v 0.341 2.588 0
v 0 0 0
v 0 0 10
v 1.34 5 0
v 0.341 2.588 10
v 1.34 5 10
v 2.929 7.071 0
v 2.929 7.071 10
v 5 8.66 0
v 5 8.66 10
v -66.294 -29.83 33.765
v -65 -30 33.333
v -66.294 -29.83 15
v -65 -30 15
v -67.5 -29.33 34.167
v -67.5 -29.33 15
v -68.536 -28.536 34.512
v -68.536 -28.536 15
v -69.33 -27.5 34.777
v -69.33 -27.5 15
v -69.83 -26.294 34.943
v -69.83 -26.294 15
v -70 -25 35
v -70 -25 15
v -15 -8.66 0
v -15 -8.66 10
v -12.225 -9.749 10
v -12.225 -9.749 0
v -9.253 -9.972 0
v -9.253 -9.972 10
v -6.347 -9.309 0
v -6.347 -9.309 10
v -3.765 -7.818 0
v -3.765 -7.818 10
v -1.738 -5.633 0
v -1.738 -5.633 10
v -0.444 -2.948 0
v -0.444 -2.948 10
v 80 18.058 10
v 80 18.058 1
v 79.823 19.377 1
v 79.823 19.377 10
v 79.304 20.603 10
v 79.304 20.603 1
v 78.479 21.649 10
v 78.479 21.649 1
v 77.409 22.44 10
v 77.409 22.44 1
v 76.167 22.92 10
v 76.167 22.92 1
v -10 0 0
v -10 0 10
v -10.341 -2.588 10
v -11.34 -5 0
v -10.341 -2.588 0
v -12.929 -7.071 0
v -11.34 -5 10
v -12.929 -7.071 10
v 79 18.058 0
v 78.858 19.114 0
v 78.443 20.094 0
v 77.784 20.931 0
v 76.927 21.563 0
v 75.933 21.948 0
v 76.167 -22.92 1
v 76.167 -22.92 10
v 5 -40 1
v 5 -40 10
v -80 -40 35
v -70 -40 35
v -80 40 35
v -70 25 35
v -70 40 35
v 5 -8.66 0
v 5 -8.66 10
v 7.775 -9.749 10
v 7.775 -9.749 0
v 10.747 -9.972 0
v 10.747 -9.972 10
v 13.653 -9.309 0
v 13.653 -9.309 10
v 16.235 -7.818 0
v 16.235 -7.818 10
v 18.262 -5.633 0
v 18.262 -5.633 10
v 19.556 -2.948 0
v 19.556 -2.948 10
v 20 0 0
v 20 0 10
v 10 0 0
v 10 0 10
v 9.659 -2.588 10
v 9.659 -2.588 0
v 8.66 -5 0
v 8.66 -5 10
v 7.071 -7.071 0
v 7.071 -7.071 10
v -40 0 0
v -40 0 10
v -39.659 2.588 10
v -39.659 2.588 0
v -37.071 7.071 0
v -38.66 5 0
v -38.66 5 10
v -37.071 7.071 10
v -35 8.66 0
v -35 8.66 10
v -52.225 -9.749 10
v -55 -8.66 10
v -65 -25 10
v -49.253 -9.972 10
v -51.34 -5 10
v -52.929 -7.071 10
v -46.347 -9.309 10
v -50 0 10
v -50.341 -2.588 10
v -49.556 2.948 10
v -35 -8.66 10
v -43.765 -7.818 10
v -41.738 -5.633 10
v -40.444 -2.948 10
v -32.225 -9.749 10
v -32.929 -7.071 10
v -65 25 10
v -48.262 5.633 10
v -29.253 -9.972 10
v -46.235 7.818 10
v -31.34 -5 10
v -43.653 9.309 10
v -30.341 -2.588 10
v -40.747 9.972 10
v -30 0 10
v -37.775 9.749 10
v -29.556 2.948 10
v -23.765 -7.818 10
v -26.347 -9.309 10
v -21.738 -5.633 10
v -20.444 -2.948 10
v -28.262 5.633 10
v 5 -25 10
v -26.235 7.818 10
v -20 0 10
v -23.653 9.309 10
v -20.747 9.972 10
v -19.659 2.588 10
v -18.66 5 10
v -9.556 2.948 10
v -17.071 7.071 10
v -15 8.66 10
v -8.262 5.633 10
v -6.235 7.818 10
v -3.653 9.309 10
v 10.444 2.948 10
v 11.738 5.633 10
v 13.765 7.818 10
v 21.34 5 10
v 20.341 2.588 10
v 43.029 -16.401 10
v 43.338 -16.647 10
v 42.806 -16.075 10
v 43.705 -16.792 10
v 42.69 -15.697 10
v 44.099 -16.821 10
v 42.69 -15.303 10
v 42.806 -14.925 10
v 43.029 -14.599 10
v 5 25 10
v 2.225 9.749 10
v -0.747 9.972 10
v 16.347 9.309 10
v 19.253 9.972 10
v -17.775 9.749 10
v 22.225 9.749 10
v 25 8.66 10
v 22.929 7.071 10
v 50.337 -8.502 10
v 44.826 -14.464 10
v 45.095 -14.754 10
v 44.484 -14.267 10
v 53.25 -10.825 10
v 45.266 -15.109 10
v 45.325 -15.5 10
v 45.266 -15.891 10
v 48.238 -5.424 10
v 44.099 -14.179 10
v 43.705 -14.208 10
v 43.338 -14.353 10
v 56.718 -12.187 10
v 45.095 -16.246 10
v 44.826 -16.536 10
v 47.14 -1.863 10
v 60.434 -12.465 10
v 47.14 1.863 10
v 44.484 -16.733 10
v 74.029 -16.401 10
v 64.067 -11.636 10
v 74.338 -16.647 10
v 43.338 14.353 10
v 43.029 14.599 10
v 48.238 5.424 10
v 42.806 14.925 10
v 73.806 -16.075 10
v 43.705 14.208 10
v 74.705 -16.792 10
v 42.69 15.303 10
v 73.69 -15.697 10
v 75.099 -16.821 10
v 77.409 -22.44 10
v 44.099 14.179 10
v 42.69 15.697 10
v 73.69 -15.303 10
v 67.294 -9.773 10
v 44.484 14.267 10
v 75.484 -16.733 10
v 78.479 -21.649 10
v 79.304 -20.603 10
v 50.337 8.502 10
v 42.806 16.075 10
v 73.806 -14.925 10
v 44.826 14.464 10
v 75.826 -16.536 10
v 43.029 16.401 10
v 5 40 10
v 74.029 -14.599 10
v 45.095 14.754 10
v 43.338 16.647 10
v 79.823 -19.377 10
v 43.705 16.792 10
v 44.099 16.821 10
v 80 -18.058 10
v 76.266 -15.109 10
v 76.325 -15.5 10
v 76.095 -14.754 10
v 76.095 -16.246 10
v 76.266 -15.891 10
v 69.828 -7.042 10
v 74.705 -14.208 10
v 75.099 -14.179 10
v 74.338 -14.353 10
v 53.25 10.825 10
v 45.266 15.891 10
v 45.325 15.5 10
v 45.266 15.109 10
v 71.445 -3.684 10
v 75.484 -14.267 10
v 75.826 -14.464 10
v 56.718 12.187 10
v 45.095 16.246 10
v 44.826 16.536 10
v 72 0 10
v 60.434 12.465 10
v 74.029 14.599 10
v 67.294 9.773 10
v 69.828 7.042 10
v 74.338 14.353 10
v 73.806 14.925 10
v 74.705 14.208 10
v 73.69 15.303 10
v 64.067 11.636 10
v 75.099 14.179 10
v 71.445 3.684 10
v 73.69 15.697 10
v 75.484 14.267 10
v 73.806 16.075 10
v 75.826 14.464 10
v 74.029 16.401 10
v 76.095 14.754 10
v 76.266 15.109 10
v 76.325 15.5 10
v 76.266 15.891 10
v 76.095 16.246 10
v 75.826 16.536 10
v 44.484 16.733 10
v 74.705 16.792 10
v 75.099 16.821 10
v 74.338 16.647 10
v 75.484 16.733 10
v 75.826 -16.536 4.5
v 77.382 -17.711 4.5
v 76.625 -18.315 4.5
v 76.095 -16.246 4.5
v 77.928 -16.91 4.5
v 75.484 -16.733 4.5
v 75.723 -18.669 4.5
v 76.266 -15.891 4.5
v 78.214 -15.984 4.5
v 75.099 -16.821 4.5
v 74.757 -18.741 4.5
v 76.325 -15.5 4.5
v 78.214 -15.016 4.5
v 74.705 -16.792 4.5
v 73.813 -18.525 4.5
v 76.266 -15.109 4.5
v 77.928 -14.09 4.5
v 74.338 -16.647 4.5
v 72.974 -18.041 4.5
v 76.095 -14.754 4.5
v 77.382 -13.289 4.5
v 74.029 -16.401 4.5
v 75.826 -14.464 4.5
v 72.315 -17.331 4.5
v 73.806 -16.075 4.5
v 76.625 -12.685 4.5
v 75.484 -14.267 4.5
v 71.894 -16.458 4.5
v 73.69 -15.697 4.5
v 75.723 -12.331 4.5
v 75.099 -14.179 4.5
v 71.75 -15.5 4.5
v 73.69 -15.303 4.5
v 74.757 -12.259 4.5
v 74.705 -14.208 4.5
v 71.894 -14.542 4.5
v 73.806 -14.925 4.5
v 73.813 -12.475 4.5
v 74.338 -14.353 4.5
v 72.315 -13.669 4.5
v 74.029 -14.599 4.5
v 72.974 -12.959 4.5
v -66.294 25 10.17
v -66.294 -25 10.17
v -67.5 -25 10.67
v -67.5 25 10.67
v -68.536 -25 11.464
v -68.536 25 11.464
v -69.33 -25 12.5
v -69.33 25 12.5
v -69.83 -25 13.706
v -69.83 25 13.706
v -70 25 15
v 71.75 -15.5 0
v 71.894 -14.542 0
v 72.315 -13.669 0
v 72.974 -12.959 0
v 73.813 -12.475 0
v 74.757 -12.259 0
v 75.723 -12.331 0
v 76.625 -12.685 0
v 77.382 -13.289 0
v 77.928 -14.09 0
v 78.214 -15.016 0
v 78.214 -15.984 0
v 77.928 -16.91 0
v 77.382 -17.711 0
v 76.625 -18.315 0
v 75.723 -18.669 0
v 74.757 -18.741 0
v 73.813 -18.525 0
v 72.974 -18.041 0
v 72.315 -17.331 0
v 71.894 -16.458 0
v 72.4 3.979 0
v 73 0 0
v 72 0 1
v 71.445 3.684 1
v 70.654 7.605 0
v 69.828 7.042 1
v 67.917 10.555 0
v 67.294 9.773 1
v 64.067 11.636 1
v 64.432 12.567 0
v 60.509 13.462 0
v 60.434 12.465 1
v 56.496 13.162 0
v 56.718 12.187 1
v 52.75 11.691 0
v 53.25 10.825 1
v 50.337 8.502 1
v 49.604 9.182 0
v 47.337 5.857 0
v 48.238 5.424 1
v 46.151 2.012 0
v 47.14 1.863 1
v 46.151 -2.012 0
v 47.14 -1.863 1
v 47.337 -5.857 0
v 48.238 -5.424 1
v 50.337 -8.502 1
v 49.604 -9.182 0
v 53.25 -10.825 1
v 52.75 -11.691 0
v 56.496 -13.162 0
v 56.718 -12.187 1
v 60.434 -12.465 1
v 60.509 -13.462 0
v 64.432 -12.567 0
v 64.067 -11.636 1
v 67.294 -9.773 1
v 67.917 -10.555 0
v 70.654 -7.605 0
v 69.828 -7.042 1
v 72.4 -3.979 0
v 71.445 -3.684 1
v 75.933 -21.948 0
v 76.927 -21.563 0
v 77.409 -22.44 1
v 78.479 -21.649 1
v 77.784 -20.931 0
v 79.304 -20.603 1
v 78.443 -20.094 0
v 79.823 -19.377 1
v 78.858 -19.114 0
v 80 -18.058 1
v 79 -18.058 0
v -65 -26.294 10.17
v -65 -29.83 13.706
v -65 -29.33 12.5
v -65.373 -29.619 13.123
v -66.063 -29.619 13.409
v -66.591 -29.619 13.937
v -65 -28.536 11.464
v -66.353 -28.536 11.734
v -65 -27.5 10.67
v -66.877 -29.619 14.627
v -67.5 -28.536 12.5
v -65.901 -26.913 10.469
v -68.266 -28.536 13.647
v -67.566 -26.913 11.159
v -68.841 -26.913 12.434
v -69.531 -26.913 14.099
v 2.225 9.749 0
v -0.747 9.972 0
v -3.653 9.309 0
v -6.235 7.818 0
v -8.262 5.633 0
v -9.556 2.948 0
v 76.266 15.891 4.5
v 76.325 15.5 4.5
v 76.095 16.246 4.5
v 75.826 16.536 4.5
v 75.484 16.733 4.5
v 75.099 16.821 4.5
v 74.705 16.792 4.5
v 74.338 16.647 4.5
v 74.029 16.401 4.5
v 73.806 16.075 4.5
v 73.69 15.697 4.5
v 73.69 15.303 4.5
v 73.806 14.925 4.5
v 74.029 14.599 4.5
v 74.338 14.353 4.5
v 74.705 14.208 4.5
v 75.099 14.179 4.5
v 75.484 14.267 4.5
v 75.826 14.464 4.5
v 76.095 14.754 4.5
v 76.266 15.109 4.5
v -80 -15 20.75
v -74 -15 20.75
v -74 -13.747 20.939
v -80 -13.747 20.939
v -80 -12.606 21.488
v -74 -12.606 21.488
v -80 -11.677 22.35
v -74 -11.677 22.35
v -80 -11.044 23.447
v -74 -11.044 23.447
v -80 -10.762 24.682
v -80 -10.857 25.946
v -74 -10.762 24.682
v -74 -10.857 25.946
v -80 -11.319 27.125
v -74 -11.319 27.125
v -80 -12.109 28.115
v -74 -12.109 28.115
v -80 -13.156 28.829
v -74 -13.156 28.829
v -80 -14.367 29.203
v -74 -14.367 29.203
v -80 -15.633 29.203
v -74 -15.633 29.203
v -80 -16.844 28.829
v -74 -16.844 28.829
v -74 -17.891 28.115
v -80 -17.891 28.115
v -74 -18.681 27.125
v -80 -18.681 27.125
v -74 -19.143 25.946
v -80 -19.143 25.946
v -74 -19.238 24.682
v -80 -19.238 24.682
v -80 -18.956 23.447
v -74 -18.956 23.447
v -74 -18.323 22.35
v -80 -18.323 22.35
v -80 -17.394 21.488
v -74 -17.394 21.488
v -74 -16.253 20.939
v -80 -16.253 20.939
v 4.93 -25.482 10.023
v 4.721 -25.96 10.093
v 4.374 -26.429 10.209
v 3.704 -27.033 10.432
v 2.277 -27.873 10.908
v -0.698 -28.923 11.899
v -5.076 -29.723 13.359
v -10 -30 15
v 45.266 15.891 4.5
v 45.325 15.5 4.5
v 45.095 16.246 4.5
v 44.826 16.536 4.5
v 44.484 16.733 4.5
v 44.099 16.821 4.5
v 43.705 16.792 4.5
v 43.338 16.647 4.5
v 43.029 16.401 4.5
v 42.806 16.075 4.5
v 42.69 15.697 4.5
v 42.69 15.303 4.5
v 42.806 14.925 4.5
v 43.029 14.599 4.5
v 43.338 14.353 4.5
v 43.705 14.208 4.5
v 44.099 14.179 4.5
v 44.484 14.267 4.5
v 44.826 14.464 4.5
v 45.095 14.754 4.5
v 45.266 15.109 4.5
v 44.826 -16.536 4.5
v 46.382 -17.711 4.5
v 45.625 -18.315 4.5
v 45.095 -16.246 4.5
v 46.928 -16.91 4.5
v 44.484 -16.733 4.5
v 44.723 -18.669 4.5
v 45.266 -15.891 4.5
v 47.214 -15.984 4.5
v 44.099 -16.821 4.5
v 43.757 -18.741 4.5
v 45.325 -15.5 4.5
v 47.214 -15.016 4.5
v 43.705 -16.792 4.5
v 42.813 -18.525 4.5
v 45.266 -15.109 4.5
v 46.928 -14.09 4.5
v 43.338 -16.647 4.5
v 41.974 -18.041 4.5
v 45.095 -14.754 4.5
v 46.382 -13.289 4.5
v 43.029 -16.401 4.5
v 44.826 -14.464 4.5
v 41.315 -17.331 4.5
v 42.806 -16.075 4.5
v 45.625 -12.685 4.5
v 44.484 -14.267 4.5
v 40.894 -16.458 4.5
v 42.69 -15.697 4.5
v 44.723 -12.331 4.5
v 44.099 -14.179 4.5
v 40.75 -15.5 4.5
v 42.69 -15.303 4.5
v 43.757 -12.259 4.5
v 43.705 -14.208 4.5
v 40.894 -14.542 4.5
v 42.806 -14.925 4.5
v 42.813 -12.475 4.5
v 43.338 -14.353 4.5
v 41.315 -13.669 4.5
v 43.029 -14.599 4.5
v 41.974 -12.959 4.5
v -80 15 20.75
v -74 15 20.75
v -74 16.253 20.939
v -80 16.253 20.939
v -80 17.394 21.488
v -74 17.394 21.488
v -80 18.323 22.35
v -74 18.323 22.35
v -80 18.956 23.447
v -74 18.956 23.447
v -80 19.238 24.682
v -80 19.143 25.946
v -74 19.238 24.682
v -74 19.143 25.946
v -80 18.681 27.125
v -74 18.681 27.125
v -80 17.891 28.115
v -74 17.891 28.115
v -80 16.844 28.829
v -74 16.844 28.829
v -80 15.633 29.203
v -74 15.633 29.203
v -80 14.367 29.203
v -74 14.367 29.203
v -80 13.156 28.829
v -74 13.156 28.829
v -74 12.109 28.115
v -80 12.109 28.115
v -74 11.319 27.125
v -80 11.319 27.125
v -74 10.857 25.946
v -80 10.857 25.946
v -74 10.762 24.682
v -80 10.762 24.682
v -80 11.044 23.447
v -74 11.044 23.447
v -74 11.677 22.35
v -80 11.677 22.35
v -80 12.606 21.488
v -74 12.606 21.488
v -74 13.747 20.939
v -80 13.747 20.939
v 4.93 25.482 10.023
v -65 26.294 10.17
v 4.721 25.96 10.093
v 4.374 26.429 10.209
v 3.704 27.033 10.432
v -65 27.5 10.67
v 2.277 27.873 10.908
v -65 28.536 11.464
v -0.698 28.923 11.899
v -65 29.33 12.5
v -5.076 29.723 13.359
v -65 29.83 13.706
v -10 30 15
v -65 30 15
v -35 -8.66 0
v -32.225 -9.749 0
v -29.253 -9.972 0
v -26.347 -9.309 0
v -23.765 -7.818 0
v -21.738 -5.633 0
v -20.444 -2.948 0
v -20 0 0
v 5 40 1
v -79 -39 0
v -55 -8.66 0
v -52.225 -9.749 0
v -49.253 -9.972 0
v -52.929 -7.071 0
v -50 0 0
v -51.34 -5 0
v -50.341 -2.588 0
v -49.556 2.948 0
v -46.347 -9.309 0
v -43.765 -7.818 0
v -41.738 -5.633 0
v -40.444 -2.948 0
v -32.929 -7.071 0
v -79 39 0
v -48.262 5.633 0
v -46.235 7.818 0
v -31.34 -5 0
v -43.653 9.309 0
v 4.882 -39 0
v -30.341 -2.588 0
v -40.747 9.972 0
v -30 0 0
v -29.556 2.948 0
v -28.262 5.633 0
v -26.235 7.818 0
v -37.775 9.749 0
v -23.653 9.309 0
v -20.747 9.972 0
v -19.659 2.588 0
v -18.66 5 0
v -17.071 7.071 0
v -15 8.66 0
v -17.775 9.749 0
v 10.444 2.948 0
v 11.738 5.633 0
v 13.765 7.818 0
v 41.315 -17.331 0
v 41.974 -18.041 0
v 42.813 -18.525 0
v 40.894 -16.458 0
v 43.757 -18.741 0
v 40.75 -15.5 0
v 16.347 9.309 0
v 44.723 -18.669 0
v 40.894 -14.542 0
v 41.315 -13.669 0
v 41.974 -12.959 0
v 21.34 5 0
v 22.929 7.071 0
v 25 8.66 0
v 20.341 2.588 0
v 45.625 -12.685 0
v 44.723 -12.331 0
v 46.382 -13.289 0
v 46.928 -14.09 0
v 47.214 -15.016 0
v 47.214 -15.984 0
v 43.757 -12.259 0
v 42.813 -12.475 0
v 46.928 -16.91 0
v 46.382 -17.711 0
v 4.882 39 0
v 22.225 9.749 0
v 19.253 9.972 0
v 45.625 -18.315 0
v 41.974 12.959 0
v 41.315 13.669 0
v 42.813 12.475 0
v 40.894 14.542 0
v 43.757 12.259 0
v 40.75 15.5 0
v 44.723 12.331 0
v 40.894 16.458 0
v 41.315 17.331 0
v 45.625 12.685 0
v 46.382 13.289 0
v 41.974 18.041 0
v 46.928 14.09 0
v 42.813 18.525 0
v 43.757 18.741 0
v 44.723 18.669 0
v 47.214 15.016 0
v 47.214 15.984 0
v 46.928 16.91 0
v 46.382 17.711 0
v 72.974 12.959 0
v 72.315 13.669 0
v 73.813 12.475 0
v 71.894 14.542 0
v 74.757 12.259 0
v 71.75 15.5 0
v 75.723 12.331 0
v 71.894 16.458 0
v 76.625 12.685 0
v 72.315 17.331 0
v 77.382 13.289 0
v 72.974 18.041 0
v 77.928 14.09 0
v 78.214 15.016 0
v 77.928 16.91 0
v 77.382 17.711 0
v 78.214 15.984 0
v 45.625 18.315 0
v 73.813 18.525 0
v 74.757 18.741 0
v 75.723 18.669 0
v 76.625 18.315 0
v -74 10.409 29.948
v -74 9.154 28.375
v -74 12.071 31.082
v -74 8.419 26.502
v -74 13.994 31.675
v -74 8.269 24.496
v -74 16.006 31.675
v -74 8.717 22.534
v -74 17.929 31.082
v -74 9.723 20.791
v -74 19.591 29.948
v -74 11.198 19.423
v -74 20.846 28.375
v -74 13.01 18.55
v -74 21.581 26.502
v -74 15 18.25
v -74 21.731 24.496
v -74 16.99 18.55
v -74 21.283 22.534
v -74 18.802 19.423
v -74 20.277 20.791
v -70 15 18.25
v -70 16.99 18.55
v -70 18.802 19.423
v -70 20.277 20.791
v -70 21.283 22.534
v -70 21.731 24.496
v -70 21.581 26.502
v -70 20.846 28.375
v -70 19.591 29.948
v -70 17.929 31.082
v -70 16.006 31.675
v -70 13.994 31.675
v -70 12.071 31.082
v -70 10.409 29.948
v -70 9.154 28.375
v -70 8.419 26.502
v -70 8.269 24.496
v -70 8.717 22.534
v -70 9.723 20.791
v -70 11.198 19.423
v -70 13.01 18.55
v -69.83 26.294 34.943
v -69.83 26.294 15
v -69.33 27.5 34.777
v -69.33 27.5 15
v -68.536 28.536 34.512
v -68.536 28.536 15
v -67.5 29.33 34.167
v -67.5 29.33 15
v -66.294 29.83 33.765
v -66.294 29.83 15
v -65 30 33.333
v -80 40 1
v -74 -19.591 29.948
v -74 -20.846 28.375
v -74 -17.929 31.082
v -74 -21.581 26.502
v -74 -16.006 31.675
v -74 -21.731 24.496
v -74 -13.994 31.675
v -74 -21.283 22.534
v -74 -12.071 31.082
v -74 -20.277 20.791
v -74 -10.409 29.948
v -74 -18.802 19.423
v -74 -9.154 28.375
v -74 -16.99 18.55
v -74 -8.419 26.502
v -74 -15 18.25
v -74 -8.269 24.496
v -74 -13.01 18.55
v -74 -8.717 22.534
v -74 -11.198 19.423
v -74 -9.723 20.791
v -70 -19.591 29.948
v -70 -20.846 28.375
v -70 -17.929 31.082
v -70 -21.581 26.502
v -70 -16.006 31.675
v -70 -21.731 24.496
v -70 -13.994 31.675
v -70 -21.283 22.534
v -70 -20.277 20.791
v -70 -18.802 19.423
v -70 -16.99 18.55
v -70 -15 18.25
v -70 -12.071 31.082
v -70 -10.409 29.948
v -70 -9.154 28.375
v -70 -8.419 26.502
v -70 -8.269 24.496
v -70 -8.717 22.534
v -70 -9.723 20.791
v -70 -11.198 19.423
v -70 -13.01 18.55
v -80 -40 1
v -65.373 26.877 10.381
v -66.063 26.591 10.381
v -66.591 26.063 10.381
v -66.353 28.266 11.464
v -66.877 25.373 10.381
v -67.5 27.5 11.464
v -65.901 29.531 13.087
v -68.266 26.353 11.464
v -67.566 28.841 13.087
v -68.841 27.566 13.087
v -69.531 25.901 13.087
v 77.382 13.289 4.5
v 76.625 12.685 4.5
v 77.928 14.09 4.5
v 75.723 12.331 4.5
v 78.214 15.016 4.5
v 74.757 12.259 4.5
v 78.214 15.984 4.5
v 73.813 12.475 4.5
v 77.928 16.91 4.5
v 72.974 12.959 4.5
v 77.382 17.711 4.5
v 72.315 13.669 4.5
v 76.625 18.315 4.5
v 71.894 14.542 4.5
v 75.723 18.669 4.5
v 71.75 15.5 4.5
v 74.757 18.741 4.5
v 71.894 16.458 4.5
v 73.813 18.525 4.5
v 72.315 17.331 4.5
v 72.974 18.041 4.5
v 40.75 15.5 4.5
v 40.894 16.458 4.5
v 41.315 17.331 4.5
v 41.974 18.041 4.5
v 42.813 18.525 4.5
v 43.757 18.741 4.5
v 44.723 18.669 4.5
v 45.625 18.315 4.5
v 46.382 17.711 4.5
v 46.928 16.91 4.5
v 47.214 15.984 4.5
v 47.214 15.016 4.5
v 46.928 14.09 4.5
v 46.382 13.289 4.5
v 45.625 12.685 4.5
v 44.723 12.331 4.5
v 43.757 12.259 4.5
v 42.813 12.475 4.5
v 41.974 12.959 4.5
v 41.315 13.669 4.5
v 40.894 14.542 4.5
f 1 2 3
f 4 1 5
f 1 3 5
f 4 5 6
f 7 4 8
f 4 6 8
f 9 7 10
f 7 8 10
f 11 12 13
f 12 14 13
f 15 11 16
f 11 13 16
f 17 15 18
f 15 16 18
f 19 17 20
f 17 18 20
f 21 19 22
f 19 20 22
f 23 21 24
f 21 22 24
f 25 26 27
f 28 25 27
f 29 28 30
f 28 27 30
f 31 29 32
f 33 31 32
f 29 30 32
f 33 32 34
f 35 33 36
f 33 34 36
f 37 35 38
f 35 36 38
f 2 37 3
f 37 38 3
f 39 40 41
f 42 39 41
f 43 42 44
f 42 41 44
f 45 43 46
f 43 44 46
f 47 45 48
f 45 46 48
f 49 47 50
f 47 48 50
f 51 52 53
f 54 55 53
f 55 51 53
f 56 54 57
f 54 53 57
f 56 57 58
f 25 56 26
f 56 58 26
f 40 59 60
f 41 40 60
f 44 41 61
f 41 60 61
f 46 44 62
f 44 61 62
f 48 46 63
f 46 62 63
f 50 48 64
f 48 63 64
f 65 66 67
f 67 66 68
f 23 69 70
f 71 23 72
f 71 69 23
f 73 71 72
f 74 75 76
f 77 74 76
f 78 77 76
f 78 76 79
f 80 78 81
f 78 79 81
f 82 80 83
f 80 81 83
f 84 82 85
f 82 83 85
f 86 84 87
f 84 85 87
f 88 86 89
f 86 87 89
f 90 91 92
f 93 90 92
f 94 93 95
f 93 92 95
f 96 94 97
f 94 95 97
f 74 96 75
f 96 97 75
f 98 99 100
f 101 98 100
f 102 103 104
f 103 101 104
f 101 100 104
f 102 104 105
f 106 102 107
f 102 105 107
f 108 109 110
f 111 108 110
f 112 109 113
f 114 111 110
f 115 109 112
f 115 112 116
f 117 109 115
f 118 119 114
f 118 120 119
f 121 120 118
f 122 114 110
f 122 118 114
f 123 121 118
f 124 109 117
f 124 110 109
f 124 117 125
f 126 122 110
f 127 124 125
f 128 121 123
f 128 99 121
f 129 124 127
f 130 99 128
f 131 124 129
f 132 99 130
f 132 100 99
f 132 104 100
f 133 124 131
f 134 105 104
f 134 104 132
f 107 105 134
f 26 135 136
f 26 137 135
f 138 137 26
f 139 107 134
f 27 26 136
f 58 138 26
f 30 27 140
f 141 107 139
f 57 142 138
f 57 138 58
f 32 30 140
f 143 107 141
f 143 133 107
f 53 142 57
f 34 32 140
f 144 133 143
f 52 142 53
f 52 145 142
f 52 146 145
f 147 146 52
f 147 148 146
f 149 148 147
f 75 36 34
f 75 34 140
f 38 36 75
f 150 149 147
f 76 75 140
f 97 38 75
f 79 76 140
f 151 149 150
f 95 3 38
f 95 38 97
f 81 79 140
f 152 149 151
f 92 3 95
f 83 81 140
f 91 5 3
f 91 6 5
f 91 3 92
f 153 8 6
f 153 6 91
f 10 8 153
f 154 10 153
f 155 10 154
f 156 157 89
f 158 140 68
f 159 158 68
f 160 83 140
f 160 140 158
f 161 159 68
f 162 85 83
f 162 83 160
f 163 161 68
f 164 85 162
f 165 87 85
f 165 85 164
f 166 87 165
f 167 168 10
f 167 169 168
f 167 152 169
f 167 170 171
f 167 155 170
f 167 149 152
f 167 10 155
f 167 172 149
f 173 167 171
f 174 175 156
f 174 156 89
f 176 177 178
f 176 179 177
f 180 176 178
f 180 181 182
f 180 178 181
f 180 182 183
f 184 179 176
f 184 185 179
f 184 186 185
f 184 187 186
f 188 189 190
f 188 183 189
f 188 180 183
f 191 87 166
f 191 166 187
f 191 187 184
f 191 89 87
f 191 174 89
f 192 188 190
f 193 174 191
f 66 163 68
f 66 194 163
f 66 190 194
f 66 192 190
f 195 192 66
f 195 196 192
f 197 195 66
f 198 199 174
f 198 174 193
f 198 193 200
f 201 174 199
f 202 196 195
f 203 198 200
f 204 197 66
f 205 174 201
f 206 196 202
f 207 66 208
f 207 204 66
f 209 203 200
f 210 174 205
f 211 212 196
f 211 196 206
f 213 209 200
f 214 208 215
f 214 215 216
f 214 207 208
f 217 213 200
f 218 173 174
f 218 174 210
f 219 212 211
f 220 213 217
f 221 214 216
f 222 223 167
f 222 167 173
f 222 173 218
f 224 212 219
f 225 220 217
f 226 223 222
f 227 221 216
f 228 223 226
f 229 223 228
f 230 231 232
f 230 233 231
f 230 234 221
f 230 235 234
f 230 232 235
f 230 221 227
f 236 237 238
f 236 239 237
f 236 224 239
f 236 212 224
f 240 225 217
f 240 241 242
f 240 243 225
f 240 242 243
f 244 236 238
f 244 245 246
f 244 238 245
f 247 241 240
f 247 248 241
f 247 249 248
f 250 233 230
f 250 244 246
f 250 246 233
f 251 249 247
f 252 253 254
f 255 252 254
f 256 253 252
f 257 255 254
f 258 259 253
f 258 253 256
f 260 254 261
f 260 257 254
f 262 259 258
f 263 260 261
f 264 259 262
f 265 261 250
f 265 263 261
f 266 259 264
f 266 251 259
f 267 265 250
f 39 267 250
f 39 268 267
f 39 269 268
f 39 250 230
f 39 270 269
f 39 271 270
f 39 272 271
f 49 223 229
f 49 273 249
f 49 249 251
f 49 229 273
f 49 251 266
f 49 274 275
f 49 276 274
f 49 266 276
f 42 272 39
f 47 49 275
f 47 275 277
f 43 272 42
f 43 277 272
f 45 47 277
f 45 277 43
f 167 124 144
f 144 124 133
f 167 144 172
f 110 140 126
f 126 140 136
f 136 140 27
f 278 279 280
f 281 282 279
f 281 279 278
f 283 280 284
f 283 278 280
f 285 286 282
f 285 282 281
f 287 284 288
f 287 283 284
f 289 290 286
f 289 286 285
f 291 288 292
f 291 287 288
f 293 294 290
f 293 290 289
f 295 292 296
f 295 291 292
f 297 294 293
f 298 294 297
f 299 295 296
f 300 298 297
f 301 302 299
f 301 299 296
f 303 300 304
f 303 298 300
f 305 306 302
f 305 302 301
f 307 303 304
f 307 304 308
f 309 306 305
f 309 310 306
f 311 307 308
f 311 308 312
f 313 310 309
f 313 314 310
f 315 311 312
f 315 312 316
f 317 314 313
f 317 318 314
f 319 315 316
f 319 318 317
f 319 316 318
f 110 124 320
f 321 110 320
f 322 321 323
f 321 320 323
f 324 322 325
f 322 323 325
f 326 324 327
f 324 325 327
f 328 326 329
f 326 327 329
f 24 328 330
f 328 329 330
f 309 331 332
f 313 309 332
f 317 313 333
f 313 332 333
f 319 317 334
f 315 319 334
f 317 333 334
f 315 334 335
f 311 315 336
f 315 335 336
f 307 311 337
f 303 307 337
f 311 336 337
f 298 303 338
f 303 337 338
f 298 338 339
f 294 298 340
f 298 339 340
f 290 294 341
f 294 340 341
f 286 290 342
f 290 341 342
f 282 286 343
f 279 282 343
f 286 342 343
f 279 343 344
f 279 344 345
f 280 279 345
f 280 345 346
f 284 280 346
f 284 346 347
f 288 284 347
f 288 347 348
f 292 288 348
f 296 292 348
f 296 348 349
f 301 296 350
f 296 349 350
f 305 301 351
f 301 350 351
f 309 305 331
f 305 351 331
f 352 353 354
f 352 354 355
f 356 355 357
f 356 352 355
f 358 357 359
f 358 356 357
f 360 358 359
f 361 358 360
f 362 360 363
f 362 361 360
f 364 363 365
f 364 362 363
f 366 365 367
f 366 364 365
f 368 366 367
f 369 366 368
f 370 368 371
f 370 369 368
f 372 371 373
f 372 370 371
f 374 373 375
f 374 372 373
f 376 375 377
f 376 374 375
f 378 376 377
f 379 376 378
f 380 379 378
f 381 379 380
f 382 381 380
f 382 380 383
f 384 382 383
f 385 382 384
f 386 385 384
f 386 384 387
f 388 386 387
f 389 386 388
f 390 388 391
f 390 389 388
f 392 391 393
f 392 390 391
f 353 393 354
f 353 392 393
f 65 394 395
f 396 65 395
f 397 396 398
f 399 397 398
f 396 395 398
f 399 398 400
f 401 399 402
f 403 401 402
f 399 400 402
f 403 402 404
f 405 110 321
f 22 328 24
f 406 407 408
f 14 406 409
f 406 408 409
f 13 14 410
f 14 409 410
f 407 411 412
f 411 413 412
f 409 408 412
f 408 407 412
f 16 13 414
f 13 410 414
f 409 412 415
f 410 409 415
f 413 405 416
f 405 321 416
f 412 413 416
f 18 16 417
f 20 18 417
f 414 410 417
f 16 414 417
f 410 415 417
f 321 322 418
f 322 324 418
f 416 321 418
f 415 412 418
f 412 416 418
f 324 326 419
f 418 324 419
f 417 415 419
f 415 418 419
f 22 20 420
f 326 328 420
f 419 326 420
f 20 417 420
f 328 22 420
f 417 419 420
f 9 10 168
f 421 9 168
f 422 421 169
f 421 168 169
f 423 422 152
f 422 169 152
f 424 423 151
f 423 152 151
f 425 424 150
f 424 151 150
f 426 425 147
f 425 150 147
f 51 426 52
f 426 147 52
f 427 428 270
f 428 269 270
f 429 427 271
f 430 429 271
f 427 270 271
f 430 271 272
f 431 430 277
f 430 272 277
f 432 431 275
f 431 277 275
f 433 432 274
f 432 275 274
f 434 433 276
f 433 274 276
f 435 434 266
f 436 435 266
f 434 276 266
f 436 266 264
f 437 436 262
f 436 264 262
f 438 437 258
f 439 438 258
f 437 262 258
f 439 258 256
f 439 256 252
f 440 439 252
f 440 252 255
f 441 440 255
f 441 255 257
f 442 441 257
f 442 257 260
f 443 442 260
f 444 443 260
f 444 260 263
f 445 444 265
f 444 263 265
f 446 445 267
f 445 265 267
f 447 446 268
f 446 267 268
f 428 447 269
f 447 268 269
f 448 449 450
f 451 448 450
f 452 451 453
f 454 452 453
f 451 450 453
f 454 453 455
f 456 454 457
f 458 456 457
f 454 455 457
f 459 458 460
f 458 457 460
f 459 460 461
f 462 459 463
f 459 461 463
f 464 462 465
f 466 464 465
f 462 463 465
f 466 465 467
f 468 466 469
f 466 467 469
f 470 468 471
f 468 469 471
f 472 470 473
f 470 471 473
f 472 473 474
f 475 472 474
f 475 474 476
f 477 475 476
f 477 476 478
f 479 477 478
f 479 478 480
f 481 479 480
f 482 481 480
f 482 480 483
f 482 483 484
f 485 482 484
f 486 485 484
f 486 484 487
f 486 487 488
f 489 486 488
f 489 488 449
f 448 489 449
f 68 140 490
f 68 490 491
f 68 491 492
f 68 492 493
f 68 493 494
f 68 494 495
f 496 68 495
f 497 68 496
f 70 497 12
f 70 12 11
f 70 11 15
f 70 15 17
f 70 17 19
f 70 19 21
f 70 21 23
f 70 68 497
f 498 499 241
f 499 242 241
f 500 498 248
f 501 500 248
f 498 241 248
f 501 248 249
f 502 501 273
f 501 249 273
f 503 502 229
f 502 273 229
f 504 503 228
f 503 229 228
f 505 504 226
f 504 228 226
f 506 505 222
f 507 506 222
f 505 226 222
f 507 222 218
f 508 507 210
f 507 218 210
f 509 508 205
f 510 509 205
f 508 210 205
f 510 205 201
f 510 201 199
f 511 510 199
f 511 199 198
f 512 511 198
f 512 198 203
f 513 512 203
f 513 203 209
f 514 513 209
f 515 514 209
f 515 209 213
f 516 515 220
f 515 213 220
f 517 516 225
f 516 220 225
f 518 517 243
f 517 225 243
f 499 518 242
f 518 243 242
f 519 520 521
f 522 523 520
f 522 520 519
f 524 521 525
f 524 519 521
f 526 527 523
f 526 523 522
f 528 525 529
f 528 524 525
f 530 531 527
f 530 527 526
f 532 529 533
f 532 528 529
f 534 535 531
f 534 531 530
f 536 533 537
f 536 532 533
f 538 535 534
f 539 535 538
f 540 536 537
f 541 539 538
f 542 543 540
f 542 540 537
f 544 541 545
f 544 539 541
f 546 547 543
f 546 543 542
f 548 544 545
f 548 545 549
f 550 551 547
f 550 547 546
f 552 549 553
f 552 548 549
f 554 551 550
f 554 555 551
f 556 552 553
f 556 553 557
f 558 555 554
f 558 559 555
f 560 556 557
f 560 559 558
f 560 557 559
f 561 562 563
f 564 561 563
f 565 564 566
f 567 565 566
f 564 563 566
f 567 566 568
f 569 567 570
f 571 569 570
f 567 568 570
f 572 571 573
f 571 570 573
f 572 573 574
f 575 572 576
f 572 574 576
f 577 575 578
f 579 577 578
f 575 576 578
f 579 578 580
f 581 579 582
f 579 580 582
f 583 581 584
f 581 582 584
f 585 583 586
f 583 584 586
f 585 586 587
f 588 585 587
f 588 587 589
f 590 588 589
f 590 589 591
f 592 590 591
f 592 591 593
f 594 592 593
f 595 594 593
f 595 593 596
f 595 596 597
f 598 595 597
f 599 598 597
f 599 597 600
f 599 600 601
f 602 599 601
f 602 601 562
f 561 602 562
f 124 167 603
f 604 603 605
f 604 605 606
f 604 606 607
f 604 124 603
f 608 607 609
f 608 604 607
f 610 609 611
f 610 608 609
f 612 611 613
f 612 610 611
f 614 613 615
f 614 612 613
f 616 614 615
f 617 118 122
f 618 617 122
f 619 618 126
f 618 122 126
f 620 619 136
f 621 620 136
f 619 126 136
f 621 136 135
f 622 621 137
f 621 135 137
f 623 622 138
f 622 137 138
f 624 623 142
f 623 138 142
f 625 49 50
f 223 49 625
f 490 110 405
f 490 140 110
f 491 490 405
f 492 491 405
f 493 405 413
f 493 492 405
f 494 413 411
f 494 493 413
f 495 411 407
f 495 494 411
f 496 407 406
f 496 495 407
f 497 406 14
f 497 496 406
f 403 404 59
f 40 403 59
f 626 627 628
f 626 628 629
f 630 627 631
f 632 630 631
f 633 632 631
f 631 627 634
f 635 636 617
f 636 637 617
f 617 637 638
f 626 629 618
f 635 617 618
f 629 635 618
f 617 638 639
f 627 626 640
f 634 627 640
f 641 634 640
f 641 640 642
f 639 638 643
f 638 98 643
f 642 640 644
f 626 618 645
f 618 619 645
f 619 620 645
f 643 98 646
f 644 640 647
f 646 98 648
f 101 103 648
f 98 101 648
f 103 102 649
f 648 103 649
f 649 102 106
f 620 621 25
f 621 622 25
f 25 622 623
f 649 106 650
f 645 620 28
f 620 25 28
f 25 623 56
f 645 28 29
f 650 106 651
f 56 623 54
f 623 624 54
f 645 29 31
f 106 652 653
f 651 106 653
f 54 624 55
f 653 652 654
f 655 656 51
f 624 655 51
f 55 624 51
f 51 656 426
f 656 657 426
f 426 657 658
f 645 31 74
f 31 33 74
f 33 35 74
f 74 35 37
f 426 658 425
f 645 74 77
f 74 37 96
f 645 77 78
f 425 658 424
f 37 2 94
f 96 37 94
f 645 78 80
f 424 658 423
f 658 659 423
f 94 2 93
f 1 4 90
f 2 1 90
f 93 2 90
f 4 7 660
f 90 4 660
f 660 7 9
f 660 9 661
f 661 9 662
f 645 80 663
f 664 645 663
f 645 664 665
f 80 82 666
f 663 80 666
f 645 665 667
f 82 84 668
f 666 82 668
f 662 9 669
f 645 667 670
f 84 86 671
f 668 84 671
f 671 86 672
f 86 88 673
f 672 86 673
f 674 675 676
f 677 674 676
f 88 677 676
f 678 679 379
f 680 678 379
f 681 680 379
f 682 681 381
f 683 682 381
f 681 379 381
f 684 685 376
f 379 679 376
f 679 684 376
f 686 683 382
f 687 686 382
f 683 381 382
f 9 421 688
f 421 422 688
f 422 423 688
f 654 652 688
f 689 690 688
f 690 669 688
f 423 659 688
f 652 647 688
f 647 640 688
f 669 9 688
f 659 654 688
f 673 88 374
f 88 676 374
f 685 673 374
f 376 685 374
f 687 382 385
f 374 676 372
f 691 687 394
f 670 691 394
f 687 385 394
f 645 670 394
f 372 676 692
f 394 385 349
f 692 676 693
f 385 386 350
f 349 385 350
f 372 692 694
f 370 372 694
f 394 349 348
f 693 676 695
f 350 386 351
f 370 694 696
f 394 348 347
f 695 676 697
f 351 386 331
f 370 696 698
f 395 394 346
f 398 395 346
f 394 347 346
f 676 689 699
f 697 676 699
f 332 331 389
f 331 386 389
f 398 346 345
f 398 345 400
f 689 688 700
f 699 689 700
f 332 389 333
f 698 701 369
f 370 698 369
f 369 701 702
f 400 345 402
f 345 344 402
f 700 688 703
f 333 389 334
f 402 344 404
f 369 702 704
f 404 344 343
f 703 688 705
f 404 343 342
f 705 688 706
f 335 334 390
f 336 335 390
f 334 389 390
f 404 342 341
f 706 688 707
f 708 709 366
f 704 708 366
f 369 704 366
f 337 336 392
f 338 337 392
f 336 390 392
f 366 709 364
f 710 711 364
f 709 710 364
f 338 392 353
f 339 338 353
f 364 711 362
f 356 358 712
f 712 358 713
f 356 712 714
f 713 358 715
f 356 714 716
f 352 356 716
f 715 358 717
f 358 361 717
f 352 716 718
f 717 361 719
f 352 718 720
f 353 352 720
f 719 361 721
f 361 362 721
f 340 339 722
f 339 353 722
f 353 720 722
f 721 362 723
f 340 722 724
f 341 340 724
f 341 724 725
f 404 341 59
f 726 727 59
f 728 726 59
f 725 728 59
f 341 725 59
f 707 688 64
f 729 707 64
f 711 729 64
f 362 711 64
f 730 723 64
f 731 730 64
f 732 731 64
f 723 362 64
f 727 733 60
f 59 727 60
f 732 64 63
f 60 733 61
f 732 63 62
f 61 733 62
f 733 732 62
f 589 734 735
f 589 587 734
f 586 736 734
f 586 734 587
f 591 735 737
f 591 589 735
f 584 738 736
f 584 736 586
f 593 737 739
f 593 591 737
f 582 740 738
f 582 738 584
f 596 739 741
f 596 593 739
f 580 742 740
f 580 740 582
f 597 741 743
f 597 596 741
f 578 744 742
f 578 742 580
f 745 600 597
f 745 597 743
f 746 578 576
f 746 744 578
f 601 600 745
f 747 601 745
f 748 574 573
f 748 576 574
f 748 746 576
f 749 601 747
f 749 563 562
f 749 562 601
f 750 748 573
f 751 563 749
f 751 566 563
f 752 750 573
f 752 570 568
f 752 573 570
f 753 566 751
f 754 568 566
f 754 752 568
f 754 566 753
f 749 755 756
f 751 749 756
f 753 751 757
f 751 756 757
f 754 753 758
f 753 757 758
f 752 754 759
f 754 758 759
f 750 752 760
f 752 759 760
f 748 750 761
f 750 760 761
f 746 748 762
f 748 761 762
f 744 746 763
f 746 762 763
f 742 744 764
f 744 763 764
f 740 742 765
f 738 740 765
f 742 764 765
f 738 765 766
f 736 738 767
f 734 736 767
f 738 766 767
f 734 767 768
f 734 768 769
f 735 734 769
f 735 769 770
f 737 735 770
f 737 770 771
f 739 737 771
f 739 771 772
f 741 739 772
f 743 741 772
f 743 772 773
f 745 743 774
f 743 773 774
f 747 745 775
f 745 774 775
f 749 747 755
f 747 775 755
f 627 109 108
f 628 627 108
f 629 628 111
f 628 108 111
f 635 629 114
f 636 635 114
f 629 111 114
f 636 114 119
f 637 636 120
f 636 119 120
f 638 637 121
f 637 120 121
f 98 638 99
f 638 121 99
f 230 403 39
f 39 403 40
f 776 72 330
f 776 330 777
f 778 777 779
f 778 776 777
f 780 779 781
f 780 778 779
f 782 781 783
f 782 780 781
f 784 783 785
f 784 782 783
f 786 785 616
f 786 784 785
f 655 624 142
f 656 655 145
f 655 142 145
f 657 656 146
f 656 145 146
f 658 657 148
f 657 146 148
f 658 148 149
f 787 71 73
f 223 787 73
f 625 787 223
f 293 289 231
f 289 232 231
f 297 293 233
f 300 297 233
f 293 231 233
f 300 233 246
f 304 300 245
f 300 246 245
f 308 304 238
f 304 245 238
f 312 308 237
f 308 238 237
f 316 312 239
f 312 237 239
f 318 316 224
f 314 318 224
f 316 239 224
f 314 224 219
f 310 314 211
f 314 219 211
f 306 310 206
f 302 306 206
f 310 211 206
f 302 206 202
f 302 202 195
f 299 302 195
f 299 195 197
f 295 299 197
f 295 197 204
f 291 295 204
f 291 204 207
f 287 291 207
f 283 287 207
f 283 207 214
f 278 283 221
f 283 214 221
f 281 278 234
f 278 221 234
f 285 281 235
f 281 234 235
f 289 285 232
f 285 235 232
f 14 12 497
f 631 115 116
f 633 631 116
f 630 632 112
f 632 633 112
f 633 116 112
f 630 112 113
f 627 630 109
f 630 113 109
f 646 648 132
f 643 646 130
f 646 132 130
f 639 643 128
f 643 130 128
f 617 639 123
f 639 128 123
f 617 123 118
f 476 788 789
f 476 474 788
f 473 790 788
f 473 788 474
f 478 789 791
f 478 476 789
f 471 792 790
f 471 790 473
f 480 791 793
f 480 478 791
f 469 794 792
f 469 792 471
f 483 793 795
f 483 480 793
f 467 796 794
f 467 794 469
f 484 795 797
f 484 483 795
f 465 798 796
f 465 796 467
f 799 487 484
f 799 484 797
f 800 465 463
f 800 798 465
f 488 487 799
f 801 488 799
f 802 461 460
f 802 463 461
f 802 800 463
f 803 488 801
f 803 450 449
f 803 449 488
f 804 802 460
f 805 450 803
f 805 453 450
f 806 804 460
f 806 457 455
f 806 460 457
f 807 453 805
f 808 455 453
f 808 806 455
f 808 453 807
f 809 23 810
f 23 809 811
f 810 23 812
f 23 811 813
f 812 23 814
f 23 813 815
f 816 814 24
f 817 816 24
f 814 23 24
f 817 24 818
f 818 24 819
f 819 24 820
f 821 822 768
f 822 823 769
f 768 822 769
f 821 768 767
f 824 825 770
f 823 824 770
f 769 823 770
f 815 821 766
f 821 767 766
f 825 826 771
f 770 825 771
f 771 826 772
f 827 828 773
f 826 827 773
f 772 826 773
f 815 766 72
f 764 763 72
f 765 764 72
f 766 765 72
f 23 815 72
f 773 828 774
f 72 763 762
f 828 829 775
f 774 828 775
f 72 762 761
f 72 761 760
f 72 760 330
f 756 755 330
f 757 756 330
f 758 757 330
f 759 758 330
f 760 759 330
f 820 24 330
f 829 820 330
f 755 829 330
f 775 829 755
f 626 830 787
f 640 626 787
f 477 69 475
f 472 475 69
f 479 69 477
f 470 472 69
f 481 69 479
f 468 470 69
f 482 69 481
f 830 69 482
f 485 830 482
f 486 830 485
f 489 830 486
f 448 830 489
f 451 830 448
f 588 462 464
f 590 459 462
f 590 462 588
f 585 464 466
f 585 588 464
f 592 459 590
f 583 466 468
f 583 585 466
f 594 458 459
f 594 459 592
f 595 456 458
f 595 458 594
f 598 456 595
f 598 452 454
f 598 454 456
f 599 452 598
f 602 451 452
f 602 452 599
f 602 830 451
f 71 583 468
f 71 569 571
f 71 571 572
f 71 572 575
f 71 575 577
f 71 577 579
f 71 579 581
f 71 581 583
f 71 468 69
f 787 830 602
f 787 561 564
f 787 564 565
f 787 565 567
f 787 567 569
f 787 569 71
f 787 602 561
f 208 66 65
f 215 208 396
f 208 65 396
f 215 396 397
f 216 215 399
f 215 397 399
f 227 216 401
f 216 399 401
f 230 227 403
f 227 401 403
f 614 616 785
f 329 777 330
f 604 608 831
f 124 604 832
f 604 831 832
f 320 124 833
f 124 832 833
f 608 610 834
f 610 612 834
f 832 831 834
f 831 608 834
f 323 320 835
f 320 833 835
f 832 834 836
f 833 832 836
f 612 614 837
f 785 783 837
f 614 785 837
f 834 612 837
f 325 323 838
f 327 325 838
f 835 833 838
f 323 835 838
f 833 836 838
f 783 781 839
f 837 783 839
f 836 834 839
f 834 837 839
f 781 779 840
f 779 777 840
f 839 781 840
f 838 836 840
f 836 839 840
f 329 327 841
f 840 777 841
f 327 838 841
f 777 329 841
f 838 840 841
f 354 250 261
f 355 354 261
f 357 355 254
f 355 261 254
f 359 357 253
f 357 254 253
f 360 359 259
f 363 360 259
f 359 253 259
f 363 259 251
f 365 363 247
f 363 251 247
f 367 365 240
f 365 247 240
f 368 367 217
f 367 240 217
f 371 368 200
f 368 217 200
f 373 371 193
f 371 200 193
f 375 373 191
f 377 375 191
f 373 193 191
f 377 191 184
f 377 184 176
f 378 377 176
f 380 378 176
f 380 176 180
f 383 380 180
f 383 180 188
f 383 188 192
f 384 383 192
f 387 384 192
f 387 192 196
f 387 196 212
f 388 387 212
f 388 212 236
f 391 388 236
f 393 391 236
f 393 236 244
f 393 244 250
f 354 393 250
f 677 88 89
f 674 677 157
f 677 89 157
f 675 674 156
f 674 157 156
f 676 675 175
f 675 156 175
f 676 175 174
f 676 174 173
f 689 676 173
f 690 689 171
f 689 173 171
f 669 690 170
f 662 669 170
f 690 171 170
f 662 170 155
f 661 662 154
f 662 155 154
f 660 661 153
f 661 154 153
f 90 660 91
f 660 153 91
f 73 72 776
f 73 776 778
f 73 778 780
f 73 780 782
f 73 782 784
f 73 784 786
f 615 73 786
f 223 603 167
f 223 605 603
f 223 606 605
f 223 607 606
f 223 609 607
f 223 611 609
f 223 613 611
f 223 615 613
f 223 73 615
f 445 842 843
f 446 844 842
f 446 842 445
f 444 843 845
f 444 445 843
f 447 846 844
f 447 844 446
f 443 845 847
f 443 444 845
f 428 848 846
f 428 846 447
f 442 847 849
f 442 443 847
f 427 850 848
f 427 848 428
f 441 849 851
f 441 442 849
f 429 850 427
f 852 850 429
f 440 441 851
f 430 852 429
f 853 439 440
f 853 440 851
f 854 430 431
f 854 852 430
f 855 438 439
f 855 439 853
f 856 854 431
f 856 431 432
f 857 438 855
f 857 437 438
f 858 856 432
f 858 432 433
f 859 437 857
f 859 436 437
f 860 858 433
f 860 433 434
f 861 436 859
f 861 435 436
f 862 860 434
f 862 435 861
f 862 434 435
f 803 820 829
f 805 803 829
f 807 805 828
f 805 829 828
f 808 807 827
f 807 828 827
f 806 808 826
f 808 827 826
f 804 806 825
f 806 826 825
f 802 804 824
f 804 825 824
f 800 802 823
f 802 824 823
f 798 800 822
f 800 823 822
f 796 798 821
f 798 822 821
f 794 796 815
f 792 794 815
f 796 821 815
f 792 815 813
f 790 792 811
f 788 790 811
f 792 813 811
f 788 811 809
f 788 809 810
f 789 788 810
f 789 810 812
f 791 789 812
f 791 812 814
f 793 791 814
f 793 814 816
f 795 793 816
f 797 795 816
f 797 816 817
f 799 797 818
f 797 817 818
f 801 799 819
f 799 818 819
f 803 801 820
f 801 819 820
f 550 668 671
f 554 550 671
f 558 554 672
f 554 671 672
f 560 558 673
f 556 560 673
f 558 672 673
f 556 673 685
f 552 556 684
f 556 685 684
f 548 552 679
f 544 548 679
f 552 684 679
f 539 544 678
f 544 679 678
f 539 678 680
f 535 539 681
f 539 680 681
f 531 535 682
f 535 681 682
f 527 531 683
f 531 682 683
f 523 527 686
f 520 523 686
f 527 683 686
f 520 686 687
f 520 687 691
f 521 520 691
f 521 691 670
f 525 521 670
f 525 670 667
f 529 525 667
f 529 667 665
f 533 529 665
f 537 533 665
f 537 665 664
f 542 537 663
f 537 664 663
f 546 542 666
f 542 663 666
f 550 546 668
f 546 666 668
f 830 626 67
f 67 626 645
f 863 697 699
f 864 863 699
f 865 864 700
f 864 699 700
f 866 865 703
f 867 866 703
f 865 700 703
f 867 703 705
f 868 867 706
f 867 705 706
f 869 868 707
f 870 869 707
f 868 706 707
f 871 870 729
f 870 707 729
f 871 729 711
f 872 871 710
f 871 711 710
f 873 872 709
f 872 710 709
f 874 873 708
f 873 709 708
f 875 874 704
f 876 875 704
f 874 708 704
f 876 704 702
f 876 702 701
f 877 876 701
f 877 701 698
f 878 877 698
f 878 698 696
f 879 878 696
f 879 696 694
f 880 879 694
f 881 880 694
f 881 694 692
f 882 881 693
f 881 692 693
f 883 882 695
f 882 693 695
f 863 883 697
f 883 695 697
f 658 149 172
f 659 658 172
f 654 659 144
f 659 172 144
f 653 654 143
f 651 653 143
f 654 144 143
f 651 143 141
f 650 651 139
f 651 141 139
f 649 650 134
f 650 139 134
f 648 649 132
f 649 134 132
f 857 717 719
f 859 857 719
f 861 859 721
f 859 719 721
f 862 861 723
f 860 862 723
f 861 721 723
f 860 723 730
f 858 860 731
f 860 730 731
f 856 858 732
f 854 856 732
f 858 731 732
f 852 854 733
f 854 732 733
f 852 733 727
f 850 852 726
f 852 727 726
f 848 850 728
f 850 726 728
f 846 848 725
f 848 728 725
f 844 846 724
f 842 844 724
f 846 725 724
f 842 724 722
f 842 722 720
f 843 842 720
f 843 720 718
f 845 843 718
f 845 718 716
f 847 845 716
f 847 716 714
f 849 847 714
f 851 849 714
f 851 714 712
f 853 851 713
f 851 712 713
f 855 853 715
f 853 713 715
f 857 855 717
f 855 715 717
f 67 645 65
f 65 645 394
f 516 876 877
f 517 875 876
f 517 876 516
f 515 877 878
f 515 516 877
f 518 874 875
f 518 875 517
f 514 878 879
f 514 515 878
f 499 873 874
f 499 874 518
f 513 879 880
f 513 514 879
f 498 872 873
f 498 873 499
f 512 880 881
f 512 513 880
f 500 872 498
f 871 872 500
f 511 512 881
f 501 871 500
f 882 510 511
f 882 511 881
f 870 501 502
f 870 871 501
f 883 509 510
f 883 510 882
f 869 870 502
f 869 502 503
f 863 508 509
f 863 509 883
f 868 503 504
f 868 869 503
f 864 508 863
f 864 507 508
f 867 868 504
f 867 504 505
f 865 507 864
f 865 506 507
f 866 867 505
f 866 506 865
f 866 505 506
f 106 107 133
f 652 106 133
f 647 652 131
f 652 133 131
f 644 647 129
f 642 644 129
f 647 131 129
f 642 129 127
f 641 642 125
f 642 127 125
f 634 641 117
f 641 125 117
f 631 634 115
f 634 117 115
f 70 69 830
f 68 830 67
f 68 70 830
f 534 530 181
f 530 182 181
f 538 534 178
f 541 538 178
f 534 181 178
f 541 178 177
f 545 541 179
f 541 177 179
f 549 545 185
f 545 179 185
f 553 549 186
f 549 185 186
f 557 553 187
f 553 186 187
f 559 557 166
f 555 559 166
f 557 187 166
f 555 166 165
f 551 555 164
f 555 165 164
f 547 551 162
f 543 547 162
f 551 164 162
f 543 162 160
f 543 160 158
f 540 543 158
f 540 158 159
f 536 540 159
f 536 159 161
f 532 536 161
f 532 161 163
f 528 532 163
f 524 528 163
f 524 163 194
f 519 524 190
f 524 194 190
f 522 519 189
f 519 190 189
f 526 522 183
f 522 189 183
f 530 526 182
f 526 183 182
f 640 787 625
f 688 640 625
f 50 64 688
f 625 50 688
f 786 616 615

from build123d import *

# Parameters (mm, degrees)
SKETCH1_W           = 160
SKETCH1_H           = 80
BOSS_EXTRUDE1_DEPTH = 10
SKETCH2_R           = 1.325
SKETCH2_R_2         = 12.5
CUT_EXTRUDE1_DEPTH  = 3
CUT_EXTRUDE2_REACH  = 9
SKETCH4_R           = 1.325
SKETCH4_R_2         = 12.5
SKETCH7_W           = 10
SKETCH7_H           = 80
BOSS_EXTRUDE3_DEPTH = 25
BOSS_EXTRUDE4_DEPTH = 10
BOSS_EXTRUDE5_DEPTH = 10
CUT_EXTRUDE3_REACH  = 12
CUT_EXTRUDE4_DEPTH  = 10
FILLET1_R           = 5
SKETCH12_R          = 3.25
CUT_EXTRUDE5_DEPTH  = 4.5
CUT_EXTRUDE6_REACH  = 12
SKETCH13_R          = 4.25
SKETCH14_R          = 6.75
CUT_EXTRUDE7_DEPTH  = 4
FILLET2_R           = 5
CHAMFER2_SIZE       = 1


with BuildPart() as part:
    # Sketch1 → Boss-Extrude1 (new body)
    with BuildSketch(Plane.XY):
        Rectangle(SKETCH1_W, SKETCH1_H)
    extrude(amount=BOSS_EXTRUDE1_DEPTH)

    # Sketch2 → Cut-Extrude1 (cut)
    with BuildSketch(Plane.XY.offset(10)):
        with Locations((44, 15.5)):
            Circle(SKETCH2_R)
        with Locations((75, 15.5)):
            Circle(SKETCH2_R)
        with Locations((44, -15.5)):
            Circle(SKETCH2_R)
        with Locations((75, -15.5)):
            Circle(SKETCH2_R)
        with Locations((59.5, 0)):
            Circle(SKETCH2_R_2)
    extrude(amount=-CUT_EXTRUDE1_DEPTH, mode=Mode.SUBTRACT)

    # Sketch4 → Cut-Extrude2 (cut, up to next)
    with BuildSketch(Plane.XY.offset(7), mode=Mode.PRIVATE) as cut_extrude2_sk1:
        with Locations((75, -15.5)):
            Circle(SKETCH4_R)
    cut_extrude2_tool1 = extrude(cut_extrude2_sk1.sketch, amount=-CUT_EXTRUDE2_REACH, mode=Mode.PRIVATE) & part.part
    add(cut_extrude2_tool1.solids().sort_by_distance((75, -15.5, 7))[0], mode=Mode.SUBTRACT)
    # Sketch4 → Cut-Extrude2 (cut, up to next)
    with BuildSketch(Plane.XY.offset(7), mode=Mode.PRIVATE) as cut_extrude2_sk2:
        with Locations((44, -15.5)):
            Circle(SKETCH4_R)
    cut_extrude2_tool2 = extrude(cut_extrude2_sk2.sketch, amount=-CUT_EXTRUDE2_REACH, mode=Mode.PRIVATE) & part.part
    add(cut_extrude2_tool2.solids().sort_by_distance((44, -15.5, 7))[0], mode=Mode.SUBTRACT)
    # Sketch4 → Cut-Extrude2 (cut, up to next)
    with BuildSketch(Plane.XY.offset(7), mode=Mode.PRIVATE) as cut_extrude2_sk3:
        with Locations((75, 15.5)):
            Circle(SKETCH4_R)
    cut_extrude2_tool3 = extrude(cut_extrude2_sk3.sketch, amount=-CUT_EXTRUDE2_REACH, mode=Mode.PRIVATE) & part.part
    add(cut_extrude2_tool3.solids().sort_by_distance((75, 15.5, 7))[0], mode=Mode.SUBTRACT)
    # Sketch4 → Cut-Extrude2 (cut, up to next)
    with BuildSketch(Plane.XY.offset(7), mode=Mode.PRIVATE) as cut_extrude2_sk4:
        with Locations((44, 15.5)):
            Circle(SKETCH4_R)
    cut_extrude2_tool4 = extrude(cut_extrude2_sk4.sketch, amount=-CUT_EXTRUDE2_REACH, mode=Mode.PRIVATE) & part.part
    add(cut_extrude2_tool4.solids().sort_by_distance((44, 15.5, 7))[0], mode=Mode.SUBTRACT)
    # Sketch4 → Cut-Extrude2 (cut, up to next)
    with BuildSketch(Plane.XY.offset(7), mode=Mode.PRIVATE) as cut_extrude2_sk5:
        with Locations((59.5, 0)):
            Circle(SKETCH4_R_2)
    cut_extrude2_tool5 = extrude(cut_extrude2_sk5.sketch, amount=-CUT_EXTRUDE2_REACH, mode=Mode.PRIVATE) & part.part
    add(cut_extrude2_tool5.solids().sort_by_distance((59.5, 0, 7))[0], mode=Mode.SUBTRACT)

    # Sketch7 → Boss-Extrude3 (add)
    with BuildSketch(Plane.XY.offset(10)):
        with Locations((-75, 0)):
            Rectangle(SKETCH7_W, SKETCH7_H)
    extrude(amount=BOSS_EXTRUDE3_DEPTH)

    # Sketch8 → Boss-Extrude4 (add)
    with BuildSketch(Plane(origin=(0, 40, 0), x_dir=(1, 0, 0), z_dir=(0, 1, 0))):
        Polygon((-70, -35), (5, -10), (-70, -10), align=None)
    extrude(amount=-BOSS_EXTRUDE4_DEPTH)

    # Sketch9 → Boss-Extrude5 (add)
    with BuildSketch(Plane.XZ.offset(40)):
        Polygon((-70, 35), (-70, 10), (5, 10), align=None)
    extrude(amount=-BOSS_EXTRUDE5_DEPTH)

    # Sketch10 → Cut-Extrude3 (cut, up to next)
    with BuildSketch(Plane.XY.offset(10), mode=Mode.PRIVATE) as cut_extrude3_sk1:
        with BuildLine():
            ThreePointArc((5, -8.660254038), (15, -8.660254038), (20, 0))
            ThreePointArc((20, 0), (21.339745962, 5), (25, 8.660254038))
            ThreePointArc((25, 8.660254038), (15, 8.660254038), (10, 0))
            ThreePointArc((10, 0), (8.660254038, -5), (5, -8.660254038))
        make_face()
    cut_extrude3_tool1 = extrude(cut_extrude3_sk1.sketch, amount=-CUT_EXTRUDE3_REACH, mode=Mode.PRIVATE) & part.part
    add(cut_extrude3_tool1.solids().sort_by_distance((15, 0, 10))[0], mode=Mode.SUBTRACT)
    # Sketch10 → Cut-Extrude3 (cut, up to next)
    with BuildSketch(Plane.XY.offset(10), mode=Mode.PRIVATE) as cut_extrude3_sk2:
        with BuildLine():
            ThreePointArc((0, 0), (1.339745962, 5), (5, 8.660254038))
            ThreePointArc((5, 8.660254038), (-5, 8.660254038), (-10, 0))
            ThreePointArc((-10, 0), (-11.339745962, -5), (-15, -8.660254038))
            ThreePointArc((-15, -8.660254038), (-5, -8.660254038), (0, 0))
        make_face()
    cut_extrude3_tool2 = extrude(cut_extrude3_sk2.sketch, amount=-CUT_EXTRUDE3_REACH, mode=Mode.PRIVATE) & part.part
    add(cut_extrude3_tool2.solids().sort_by_distance((-5, 0, 10))[0], mode=Mode.SUBTRACT)
    # Sketch10 → Cut-Extrude3 (cut, up to next)
    with BuildSketch(Plane.XY.offset(10), mode=Mode.PRIVATE) as cut_extrude3_sk3:
        with BuildLine():
            ThreePointArc((-20, 0), (-18.660254038, 5), (-15, 8.660254038))
            ThreePointArc((-15, 8.660254038), (-25, 8.660254038), (-30, 0))
            ThreePointArc((-30, 0), (-31.339745962, -5), (-35, -8.660254038))
            ThreePointArc((-35, -8.660254038), (-25, -8.660254038), (-20, 0))
        make_face()
    cut_extrude3_tool3 = extrude(cut_extrude3_sk3.sketch, amount=-CUT_EXTRUDE3_REACH, mode=Mode.PRIVATE) & part.part
    add(cut_extrude3_tool3.solids().sort_by_distance((-25, 0, 10))[0], mode=Mode.SUBTRACT)
    # Sketch10 → Cut-Extrude3 (cut, up to next)
    with BuildSketch(Plane.XY.offset(10), mode=Mode.PRIVATE) as cut_extrude3_sk4:
        with BuildLine():
            ThreePointArc((-40, 0), (-38.660254038, 5), (-35, 8.660254038))
            ThreePointArc((-35, 8.660254038), (-45, 8.660254038), (-50, 0))
            ThreePointArc((-50, 0), (-51.339745962, -5), (-55, -8.660254038))
            ThreePointArc((-55, -8.660254038), (-45, -8.660254038), (-40, 0))
        make_face()
    cut_extrude3_tool4 = extrude(cut_extrude3_sk4.sketch, amount=-CUT_EXTRUDE3_REACH, mode=Mode.PRIVATE) & part.part
    add(cut_extrude3_tool4.solids().sort_by_distance((-45, 0, 10))[0], mode=Mode.SUBTRACT)

    # Sketch11 → Cut-Extrude4 (cut)
    with BuildSketch(Plane.XY.offset(10)):
        Polygon((80, 22), (5, 40), (80, 40), align=None)
        Polygon((80, -40), (80, -22), (5, -40), align=None)
    extrude(amount=-CUT_EXTRUDE4_DEPTH, mode=Mode.SUBTRACT)

    # Fillet1
    fillet1_edges = [part.edges().sort_by_distance(p)[0] for p in [
        (-70, 30, 22.5),
        (-32.5, 30, 10),
        (-70, 0, 10),
        (-32.5, -30, 10),
        (-70, -30, 22.5),
    ]]
    fillet(fillet1_edges, radius=FILLET1_R)

    # Sketch12 → Cut-Extrude5 (cut)
    with BuildSketch(Plane(origin=(0, 0, 0), x_dir=(-1, 0, 0), z_dir=(0, 0, -1))):
        with Locations((-75, 15.5)):
            Circle(SKETCH12_R)
        with Locations((-44, 15.5)):
            Circle(SKETCH12_R)
        with Locations((-44, -15.5)):
            Circle(SKETCH12_R)
        with Locations((-75, -15.5)):
            Circle(SKETCH12_R)
    extrude(amount=-CUT_EXTRUDE5_DEPTH, mode=Mode.SUBTRACT)

    # Sketch13 → Cut-Extrude6 (cut, up to next)
    with BuildSketch(Plane(origin=(-70, 0, 0), x_dir=(0, 0, -1), z_dir=(1, 0, 0)), mode=Mode.PRIVATE) as cut_extrude6_sk1:
        with Locations((-25, 15)):
            Circle(SKETCH13_R)
    cut_extrude6_tool1 = extrude(cut_extrude6_sk1.sketch, amount=-CUT_EXTRUDE6_REACH, mode=Mode.PRIVATE) & part.part
    add(cut_extrude6_tool1.solids().sort_by_distance((-70, 15, 25))[0], mode=Mode.SUBTRACT)
    # Sketch13 → Cut-Extrude6 (cut, up to next)
    with BuildSketch(Plane(origin=(-70, 0, 0), x_dir=(0, 0, -1), z_dir=(1, 0, 0)), mode=Mode.PRIVATE) as cut_extrude6_sk2:
        with Locations((-25, -15)):
            Circle(SKETCH13_R)
    cut_extrude6_tool2 = extrude(cut_extrude6_sk2.sketch, amount=-CUT_EXTRUDE6_REACH, mode=Mode.PRIVATE) & part.part
    add(cut_extrude6_tool2.solids().sort_by_distance((-70, -15, 25))[0], mode=Mode.SUBTRACT)

    # Sketch14 → Cut-Extrude7 (cut)
    with BuildSketch(Plane(origin=(-70, 0, 0), x_dir=(0, 0, -1), z_dir=(1, 0, 0))):
        with Locations((-25, 15)):
            Circle(SKETCH14_R)
        with Locations((-25, -15)):
            Circle(SKETCH14_R)
    extrude(amount=-CUT_EXTRUDE7_DEPTH, mode=Mode.SUBTRACT)

    # Fillet2
    fillet2_edges = [part.edges().sort_by_distance(p)[0] for p in [
        (80, 22, 5),
        (80, -22, 5),
    ]]
    fillet(fillet2_edges, radius=FILLET2_R)

    # Chamfer2
    chamfer2_edges = [part.edges().sort_by_distance(p)[0] for p in [
        (-37.5, 40, 0),
        (40.583432381, 31.459976229, 0),
        (40.583432381, -31.459976229, 0),
        (80, 0, 0),
        (78.926469394, 21.153631895, 0),
        (78.926469394, -21.153631895, 0),
        (47, 0, 0),
        (-37.5, -40, 0),
        (-80, 0, 0),
    ]]
    chamfer(chamfer2_edges, length=CHAMFER2_SIZE)


solid = part.part
